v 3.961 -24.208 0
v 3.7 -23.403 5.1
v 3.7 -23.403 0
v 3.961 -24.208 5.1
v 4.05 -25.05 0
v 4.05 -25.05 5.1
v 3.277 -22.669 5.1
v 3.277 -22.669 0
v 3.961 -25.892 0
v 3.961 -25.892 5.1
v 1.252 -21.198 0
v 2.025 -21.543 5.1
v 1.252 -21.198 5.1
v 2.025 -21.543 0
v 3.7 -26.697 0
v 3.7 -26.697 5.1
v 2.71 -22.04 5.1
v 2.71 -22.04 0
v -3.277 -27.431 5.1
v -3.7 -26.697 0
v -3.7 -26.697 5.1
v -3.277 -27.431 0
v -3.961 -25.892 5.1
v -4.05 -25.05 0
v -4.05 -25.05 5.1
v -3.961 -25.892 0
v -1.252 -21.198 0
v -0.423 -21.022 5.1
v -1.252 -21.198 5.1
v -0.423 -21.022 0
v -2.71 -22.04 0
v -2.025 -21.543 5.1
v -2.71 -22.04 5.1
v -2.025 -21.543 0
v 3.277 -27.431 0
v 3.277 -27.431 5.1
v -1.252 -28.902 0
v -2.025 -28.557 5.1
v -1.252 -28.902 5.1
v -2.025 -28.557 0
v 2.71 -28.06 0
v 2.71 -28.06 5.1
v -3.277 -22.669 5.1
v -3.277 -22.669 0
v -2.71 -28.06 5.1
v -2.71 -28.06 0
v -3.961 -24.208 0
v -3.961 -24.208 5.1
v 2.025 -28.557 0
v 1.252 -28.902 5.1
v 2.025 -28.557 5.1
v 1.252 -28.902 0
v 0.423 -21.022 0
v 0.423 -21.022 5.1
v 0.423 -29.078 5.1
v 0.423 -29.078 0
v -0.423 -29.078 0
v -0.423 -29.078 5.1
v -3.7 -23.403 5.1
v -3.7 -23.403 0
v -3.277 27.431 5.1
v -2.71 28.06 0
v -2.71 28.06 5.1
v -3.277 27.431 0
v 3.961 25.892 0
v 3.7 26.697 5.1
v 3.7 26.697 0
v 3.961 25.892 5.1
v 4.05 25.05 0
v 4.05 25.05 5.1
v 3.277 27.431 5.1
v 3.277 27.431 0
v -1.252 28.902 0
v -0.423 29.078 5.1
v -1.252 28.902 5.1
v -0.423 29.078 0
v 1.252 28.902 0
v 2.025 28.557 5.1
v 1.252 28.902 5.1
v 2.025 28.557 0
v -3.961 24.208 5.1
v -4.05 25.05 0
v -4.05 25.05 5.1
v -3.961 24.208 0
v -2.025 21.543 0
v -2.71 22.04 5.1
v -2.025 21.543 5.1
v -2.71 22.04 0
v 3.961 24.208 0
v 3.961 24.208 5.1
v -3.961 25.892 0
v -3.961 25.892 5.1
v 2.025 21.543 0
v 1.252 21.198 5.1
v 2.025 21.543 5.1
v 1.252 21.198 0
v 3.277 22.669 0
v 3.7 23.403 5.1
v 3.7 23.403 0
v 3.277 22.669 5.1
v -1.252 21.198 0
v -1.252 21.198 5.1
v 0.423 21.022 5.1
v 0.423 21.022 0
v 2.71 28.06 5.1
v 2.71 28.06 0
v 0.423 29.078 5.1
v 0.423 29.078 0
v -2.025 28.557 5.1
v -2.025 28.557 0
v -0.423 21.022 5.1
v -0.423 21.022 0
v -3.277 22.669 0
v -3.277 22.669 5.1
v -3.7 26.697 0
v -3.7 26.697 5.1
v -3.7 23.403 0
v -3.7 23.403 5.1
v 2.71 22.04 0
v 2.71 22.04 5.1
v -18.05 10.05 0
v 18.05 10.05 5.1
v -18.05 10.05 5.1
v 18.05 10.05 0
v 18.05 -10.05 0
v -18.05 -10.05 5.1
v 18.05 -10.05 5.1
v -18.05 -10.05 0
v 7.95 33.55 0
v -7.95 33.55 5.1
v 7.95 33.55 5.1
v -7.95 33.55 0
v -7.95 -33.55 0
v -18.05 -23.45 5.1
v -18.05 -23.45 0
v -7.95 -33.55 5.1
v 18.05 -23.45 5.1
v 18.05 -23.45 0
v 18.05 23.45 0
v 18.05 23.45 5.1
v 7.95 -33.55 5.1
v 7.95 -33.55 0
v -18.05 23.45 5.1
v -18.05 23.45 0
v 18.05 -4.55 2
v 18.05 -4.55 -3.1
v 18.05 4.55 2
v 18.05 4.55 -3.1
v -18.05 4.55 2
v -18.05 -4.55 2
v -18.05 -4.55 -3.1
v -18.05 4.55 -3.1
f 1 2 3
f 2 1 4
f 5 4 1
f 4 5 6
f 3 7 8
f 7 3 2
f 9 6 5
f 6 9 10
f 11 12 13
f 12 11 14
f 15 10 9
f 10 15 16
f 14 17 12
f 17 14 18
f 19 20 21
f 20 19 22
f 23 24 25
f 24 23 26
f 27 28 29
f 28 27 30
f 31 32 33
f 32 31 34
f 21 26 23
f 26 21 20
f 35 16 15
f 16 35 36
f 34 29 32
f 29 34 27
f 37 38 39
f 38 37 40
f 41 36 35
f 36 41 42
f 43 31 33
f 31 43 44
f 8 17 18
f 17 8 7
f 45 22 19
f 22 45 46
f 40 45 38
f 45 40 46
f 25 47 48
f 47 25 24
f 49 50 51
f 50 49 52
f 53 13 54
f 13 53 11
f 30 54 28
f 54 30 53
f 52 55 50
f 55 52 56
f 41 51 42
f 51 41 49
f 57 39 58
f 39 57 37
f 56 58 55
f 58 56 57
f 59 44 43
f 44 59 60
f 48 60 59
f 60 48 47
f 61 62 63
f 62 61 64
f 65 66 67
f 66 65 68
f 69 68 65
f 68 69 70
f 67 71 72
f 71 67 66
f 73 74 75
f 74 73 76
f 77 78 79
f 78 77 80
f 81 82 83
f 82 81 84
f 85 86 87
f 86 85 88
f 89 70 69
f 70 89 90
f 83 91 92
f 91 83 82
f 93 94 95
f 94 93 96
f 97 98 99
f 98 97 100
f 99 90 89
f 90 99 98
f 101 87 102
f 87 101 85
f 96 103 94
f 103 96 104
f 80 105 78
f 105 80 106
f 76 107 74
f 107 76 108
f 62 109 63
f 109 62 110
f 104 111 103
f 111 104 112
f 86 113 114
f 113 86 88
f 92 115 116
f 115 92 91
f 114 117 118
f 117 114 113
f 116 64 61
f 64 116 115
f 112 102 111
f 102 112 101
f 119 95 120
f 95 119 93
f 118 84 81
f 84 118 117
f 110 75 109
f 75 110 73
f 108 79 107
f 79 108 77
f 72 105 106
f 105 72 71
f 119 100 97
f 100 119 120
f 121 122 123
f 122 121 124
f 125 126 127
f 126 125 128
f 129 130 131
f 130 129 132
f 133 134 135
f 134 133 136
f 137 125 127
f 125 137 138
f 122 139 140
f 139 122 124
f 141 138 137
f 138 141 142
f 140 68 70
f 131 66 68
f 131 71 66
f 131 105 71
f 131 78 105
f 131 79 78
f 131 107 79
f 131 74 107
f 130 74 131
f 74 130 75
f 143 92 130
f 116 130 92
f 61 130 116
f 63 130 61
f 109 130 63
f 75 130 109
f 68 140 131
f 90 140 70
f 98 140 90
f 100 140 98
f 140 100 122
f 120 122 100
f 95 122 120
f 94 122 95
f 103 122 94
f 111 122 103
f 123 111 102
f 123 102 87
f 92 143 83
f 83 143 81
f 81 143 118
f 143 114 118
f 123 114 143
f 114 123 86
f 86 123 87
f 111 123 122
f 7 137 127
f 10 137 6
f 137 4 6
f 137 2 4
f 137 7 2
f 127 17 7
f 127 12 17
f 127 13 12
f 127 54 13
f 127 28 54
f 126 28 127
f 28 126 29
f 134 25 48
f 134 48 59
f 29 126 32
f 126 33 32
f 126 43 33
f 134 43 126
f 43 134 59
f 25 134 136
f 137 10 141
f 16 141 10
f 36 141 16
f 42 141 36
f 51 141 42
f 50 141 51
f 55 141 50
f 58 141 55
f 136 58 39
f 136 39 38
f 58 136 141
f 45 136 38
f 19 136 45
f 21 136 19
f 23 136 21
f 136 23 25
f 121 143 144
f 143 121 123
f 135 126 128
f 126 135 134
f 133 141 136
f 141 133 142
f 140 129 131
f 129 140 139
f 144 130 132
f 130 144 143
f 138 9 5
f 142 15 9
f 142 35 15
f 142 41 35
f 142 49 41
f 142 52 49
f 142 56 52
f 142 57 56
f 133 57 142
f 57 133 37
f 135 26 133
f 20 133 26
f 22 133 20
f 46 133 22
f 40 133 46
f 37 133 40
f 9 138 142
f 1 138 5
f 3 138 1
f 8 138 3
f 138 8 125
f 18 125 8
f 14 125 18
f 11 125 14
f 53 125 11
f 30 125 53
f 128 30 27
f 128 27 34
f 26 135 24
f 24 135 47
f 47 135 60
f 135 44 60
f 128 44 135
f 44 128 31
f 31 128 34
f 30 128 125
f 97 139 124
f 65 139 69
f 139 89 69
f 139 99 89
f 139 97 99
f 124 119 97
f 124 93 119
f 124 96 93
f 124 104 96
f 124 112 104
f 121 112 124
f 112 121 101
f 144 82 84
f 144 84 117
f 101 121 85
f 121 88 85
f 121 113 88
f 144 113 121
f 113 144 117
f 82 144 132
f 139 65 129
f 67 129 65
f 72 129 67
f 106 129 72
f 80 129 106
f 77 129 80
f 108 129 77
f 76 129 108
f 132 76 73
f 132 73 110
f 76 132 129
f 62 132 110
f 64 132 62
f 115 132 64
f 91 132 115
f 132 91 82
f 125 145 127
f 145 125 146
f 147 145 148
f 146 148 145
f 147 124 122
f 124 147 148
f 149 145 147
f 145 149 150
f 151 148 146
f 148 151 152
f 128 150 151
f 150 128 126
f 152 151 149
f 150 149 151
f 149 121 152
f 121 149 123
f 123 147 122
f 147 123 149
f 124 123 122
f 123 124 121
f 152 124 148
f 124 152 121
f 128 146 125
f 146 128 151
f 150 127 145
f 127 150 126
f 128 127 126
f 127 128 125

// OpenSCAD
/*
 * Sway Bar Spacer for Dave's Cayman
 */
$fn = 30;

PartWidth = 36.1;
PartLength = 67.1;
PartChamfer = 10.1;
PartThickness = 5.1;

HoleDiameter = 8.1;
HoleDistance = 50.1;

DentLengthTop = 20.1;
DentLengthBottom = 9.1;
DentDepth = 3.1;

union() {
    difference() {
	// Take the main profile
	Z_profile();
	// cut out the indented center and the holes for the bolts
	union() {
	    translate([0, 0, PartThickness / 2])
		cube(size=[PartWidth + 0.02, DentLengthTop, PartThickness + 0.2],
		     center = true);
	    Holes();
	}
    }

    // Add the flat bottom part
    translate([0, 0, PartThickness / 2 - DentDepth])
	cube(size=[PartWidth, DentLengthBottom, PartThickness], center=true);


    // Add the angled pieces
    Angle_part();
    mirror([0, 180, 0])
	Angle_part();
}

module Angle_part() {
    translate([-PartWidth / 2, 0, -DentDepth])
    rotate([0, 90, 0])
    linear_extrude(height = PartWidth) {
    polygon([[0, DentLengthBottom / 2],
	     [-DentDepth, DentLengthTop / 2],
	     [-DentDepth - PartThickness, DentLengthTop / 2],
	     [-PartThickness, DentLengthBottom / 2],
	    ]);
    }
}

Z_points = [
	[-PartWidth / 2 + PartChamfer, -PartLength / 2],
	[-PartWidth / 2, -PartLength / 2 + PartChamfer],
	[-PartWidth / 2, PartLength / 2 - PartChamfer],
	[-PartWidth / 2 + PartChamfer, PartLength / 2],
	[PartWidth / 2 - PartChamfer, PartLength / 2],
	[PartWidth / 2, PartLength / 2 - PartChamfer],
	[PartWidth / 2, -PartLength / 2 + PartChamfer],
	[PartWidth / 2 - PartChamfer, -PartLength / 2],
	[-PartWidth / 2 + PartChamfer, -PartLength / 2],
    ];

module Z_profile() {
    linear_extrude(height = PartThickness) {
	difference() {
	    polygon(points = Z_points);
	    /*
	    translate([0, HoleDistance / 2])
		circle(r=HoleDiameter / 2);
	    translate([0, -HoleDistance / 2])
		circle(r=HoleDiameter / 2);
	    */
	}
    }
}

module Holes() {
    union() {
	translate([0, -HoleDistance / 2, -0.1])
	    cylinder(r = HoleDiameter / 2, h = PartThickness + 0.2);
	translate([0, HoleDistance / 2, -0.1])
	    cylinder(r = HoleDiameter / 2, h = PartThickness + 0.2);
    }
}
